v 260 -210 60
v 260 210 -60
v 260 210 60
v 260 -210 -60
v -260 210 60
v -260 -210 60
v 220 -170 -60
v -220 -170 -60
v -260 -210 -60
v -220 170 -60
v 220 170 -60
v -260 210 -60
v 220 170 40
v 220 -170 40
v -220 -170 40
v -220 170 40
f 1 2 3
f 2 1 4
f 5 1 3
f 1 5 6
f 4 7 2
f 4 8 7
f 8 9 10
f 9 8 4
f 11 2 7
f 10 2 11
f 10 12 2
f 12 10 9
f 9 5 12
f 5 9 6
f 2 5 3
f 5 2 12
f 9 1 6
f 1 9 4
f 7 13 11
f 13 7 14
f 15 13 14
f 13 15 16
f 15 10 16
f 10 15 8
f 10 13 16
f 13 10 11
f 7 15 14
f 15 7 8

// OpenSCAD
// file: ../config.scad
// Shared units: millimeters
$fn = 36;

scale_major = 1.0;
build_plate_mm = 220;
head_width_mm = 160;
head_height_mm = 210;
head_depth_mm = 165;
bearing_clearance_mm = 0.25;
bowden_outer_diameter_mm = 4.0;
eye_display_size_mm = 36;

echo(str("Robot design scale: ", scale_major));
// main file
include <../config.scad>

base_width = 520;
base_depth = 420;
base_height = 120;

difference() {
    cube([base_width, base_depth, base_height], center=true);
    translate([0, 0, -20])
        cube([base_width - 80, base_depth - 80, base_height], center=true);
}
